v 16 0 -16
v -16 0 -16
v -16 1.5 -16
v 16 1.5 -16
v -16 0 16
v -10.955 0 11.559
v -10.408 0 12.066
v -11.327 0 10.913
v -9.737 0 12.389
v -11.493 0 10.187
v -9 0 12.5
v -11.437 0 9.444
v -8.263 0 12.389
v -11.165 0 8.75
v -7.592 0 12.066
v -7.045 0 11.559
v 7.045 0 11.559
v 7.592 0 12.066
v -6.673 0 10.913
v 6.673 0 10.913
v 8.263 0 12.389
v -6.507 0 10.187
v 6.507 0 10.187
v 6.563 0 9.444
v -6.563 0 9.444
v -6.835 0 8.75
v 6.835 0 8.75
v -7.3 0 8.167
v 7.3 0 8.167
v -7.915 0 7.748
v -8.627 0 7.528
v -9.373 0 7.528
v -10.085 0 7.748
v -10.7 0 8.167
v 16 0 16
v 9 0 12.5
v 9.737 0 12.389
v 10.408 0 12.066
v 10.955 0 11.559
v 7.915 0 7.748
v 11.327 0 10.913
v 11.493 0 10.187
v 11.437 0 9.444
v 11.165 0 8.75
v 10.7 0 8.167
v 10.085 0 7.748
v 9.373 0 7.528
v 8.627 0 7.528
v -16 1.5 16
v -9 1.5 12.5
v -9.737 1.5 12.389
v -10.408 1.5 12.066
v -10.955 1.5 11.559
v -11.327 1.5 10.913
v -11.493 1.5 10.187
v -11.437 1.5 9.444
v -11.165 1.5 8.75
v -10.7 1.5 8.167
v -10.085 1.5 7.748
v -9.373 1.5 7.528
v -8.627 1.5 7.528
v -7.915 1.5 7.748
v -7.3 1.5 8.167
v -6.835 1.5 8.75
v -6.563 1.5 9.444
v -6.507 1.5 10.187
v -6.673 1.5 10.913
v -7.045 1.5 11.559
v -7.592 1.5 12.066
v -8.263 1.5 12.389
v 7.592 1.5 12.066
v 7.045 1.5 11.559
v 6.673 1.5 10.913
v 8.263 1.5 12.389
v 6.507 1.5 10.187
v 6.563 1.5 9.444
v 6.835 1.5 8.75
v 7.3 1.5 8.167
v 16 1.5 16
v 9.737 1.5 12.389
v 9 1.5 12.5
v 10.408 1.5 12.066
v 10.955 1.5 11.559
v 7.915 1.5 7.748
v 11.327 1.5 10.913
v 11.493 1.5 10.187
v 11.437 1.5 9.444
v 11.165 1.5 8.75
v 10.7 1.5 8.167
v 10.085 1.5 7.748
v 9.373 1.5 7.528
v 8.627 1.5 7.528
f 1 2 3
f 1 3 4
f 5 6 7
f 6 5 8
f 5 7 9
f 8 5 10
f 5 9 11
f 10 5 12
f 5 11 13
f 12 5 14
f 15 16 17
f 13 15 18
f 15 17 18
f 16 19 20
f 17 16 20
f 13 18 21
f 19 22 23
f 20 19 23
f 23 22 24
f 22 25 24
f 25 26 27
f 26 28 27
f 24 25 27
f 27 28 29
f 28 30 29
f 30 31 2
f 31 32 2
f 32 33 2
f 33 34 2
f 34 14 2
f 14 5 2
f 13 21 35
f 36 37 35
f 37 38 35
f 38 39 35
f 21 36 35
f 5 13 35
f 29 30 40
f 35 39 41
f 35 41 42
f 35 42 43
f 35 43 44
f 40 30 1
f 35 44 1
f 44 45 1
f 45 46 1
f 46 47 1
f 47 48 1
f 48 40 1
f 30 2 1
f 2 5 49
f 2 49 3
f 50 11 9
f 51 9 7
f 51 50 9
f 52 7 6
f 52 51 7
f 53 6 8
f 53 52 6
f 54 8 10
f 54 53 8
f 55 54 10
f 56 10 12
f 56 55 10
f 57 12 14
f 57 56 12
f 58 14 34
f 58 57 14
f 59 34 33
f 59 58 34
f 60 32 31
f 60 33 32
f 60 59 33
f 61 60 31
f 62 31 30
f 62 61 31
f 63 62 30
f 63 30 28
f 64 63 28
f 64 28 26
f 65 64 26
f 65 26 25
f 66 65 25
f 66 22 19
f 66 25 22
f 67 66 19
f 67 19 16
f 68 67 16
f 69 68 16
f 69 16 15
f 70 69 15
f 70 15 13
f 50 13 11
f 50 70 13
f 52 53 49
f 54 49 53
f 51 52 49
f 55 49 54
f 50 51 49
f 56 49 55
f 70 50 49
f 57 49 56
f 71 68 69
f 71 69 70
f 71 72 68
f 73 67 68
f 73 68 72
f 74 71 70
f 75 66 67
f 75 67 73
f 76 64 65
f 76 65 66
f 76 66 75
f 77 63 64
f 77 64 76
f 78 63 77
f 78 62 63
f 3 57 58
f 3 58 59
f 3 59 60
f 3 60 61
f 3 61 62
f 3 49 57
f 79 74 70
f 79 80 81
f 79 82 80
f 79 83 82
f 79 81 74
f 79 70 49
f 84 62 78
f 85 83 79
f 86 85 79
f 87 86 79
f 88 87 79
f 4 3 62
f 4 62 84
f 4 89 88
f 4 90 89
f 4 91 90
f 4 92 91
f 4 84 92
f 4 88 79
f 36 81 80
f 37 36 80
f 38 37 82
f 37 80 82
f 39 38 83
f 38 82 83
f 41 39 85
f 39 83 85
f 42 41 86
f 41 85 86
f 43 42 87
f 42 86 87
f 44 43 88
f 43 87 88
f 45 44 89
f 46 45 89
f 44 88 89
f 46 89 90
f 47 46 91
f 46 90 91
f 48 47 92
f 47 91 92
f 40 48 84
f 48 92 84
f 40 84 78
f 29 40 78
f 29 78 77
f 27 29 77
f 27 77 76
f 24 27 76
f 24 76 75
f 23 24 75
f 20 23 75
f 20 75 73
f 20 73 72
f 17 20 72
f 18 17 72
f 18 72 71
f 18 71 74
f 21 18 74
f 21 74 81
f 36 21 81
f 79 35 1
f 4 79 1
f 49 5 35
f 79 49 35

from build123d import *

# Parameters (mm, degrees)
SKETCH_1_W          = 32
SKETCH_1_H          = 32
EXTRUDE_1_DEPTH     = 1.5
SKETCH_2_R          = 2.5
CUT_EXTRUDE_1_DEPTH = 23.677080941


with BuildPart() as part:
    # 草图1 → 凸台-拉伸1 (new body)
    with BuildSketch(Plane(origin=(0, 0, 0), x_dir=(1, 0, 0), z_dir=(0, 1, 0))):
        Rectangle(SKETCH_1_W, SKETCH_1_H)
    extrude(amount=EXTRUDE_1_DEPTH)

    # 草图2 → 切除-拉伸1 (cut, through all)
    with BuildSketch(Plane(origin=(0, 1.5, 0), x_dir=(1, 0, 0), z_dir=(0, 1, 0))):
        with Locations(Location((9, -10, 0), (0, 0, 270))):
            Circle(SKETCH_2_R)
    cut_extrude_1 = extrude(amount=-CUT_EXTRUDE_1_DEPTH, mode=Mode.SUBTRACT)

    # 镜向1: 切除-拉伸1 across plane
    add(cut_extrude_1.mirror(Plane(origin=(0, 0, 0), x_dir=(0, 0, 1), z_dir=(1, 0, 0))), mode=Mode.SUBTRACT)


solid = part.part
